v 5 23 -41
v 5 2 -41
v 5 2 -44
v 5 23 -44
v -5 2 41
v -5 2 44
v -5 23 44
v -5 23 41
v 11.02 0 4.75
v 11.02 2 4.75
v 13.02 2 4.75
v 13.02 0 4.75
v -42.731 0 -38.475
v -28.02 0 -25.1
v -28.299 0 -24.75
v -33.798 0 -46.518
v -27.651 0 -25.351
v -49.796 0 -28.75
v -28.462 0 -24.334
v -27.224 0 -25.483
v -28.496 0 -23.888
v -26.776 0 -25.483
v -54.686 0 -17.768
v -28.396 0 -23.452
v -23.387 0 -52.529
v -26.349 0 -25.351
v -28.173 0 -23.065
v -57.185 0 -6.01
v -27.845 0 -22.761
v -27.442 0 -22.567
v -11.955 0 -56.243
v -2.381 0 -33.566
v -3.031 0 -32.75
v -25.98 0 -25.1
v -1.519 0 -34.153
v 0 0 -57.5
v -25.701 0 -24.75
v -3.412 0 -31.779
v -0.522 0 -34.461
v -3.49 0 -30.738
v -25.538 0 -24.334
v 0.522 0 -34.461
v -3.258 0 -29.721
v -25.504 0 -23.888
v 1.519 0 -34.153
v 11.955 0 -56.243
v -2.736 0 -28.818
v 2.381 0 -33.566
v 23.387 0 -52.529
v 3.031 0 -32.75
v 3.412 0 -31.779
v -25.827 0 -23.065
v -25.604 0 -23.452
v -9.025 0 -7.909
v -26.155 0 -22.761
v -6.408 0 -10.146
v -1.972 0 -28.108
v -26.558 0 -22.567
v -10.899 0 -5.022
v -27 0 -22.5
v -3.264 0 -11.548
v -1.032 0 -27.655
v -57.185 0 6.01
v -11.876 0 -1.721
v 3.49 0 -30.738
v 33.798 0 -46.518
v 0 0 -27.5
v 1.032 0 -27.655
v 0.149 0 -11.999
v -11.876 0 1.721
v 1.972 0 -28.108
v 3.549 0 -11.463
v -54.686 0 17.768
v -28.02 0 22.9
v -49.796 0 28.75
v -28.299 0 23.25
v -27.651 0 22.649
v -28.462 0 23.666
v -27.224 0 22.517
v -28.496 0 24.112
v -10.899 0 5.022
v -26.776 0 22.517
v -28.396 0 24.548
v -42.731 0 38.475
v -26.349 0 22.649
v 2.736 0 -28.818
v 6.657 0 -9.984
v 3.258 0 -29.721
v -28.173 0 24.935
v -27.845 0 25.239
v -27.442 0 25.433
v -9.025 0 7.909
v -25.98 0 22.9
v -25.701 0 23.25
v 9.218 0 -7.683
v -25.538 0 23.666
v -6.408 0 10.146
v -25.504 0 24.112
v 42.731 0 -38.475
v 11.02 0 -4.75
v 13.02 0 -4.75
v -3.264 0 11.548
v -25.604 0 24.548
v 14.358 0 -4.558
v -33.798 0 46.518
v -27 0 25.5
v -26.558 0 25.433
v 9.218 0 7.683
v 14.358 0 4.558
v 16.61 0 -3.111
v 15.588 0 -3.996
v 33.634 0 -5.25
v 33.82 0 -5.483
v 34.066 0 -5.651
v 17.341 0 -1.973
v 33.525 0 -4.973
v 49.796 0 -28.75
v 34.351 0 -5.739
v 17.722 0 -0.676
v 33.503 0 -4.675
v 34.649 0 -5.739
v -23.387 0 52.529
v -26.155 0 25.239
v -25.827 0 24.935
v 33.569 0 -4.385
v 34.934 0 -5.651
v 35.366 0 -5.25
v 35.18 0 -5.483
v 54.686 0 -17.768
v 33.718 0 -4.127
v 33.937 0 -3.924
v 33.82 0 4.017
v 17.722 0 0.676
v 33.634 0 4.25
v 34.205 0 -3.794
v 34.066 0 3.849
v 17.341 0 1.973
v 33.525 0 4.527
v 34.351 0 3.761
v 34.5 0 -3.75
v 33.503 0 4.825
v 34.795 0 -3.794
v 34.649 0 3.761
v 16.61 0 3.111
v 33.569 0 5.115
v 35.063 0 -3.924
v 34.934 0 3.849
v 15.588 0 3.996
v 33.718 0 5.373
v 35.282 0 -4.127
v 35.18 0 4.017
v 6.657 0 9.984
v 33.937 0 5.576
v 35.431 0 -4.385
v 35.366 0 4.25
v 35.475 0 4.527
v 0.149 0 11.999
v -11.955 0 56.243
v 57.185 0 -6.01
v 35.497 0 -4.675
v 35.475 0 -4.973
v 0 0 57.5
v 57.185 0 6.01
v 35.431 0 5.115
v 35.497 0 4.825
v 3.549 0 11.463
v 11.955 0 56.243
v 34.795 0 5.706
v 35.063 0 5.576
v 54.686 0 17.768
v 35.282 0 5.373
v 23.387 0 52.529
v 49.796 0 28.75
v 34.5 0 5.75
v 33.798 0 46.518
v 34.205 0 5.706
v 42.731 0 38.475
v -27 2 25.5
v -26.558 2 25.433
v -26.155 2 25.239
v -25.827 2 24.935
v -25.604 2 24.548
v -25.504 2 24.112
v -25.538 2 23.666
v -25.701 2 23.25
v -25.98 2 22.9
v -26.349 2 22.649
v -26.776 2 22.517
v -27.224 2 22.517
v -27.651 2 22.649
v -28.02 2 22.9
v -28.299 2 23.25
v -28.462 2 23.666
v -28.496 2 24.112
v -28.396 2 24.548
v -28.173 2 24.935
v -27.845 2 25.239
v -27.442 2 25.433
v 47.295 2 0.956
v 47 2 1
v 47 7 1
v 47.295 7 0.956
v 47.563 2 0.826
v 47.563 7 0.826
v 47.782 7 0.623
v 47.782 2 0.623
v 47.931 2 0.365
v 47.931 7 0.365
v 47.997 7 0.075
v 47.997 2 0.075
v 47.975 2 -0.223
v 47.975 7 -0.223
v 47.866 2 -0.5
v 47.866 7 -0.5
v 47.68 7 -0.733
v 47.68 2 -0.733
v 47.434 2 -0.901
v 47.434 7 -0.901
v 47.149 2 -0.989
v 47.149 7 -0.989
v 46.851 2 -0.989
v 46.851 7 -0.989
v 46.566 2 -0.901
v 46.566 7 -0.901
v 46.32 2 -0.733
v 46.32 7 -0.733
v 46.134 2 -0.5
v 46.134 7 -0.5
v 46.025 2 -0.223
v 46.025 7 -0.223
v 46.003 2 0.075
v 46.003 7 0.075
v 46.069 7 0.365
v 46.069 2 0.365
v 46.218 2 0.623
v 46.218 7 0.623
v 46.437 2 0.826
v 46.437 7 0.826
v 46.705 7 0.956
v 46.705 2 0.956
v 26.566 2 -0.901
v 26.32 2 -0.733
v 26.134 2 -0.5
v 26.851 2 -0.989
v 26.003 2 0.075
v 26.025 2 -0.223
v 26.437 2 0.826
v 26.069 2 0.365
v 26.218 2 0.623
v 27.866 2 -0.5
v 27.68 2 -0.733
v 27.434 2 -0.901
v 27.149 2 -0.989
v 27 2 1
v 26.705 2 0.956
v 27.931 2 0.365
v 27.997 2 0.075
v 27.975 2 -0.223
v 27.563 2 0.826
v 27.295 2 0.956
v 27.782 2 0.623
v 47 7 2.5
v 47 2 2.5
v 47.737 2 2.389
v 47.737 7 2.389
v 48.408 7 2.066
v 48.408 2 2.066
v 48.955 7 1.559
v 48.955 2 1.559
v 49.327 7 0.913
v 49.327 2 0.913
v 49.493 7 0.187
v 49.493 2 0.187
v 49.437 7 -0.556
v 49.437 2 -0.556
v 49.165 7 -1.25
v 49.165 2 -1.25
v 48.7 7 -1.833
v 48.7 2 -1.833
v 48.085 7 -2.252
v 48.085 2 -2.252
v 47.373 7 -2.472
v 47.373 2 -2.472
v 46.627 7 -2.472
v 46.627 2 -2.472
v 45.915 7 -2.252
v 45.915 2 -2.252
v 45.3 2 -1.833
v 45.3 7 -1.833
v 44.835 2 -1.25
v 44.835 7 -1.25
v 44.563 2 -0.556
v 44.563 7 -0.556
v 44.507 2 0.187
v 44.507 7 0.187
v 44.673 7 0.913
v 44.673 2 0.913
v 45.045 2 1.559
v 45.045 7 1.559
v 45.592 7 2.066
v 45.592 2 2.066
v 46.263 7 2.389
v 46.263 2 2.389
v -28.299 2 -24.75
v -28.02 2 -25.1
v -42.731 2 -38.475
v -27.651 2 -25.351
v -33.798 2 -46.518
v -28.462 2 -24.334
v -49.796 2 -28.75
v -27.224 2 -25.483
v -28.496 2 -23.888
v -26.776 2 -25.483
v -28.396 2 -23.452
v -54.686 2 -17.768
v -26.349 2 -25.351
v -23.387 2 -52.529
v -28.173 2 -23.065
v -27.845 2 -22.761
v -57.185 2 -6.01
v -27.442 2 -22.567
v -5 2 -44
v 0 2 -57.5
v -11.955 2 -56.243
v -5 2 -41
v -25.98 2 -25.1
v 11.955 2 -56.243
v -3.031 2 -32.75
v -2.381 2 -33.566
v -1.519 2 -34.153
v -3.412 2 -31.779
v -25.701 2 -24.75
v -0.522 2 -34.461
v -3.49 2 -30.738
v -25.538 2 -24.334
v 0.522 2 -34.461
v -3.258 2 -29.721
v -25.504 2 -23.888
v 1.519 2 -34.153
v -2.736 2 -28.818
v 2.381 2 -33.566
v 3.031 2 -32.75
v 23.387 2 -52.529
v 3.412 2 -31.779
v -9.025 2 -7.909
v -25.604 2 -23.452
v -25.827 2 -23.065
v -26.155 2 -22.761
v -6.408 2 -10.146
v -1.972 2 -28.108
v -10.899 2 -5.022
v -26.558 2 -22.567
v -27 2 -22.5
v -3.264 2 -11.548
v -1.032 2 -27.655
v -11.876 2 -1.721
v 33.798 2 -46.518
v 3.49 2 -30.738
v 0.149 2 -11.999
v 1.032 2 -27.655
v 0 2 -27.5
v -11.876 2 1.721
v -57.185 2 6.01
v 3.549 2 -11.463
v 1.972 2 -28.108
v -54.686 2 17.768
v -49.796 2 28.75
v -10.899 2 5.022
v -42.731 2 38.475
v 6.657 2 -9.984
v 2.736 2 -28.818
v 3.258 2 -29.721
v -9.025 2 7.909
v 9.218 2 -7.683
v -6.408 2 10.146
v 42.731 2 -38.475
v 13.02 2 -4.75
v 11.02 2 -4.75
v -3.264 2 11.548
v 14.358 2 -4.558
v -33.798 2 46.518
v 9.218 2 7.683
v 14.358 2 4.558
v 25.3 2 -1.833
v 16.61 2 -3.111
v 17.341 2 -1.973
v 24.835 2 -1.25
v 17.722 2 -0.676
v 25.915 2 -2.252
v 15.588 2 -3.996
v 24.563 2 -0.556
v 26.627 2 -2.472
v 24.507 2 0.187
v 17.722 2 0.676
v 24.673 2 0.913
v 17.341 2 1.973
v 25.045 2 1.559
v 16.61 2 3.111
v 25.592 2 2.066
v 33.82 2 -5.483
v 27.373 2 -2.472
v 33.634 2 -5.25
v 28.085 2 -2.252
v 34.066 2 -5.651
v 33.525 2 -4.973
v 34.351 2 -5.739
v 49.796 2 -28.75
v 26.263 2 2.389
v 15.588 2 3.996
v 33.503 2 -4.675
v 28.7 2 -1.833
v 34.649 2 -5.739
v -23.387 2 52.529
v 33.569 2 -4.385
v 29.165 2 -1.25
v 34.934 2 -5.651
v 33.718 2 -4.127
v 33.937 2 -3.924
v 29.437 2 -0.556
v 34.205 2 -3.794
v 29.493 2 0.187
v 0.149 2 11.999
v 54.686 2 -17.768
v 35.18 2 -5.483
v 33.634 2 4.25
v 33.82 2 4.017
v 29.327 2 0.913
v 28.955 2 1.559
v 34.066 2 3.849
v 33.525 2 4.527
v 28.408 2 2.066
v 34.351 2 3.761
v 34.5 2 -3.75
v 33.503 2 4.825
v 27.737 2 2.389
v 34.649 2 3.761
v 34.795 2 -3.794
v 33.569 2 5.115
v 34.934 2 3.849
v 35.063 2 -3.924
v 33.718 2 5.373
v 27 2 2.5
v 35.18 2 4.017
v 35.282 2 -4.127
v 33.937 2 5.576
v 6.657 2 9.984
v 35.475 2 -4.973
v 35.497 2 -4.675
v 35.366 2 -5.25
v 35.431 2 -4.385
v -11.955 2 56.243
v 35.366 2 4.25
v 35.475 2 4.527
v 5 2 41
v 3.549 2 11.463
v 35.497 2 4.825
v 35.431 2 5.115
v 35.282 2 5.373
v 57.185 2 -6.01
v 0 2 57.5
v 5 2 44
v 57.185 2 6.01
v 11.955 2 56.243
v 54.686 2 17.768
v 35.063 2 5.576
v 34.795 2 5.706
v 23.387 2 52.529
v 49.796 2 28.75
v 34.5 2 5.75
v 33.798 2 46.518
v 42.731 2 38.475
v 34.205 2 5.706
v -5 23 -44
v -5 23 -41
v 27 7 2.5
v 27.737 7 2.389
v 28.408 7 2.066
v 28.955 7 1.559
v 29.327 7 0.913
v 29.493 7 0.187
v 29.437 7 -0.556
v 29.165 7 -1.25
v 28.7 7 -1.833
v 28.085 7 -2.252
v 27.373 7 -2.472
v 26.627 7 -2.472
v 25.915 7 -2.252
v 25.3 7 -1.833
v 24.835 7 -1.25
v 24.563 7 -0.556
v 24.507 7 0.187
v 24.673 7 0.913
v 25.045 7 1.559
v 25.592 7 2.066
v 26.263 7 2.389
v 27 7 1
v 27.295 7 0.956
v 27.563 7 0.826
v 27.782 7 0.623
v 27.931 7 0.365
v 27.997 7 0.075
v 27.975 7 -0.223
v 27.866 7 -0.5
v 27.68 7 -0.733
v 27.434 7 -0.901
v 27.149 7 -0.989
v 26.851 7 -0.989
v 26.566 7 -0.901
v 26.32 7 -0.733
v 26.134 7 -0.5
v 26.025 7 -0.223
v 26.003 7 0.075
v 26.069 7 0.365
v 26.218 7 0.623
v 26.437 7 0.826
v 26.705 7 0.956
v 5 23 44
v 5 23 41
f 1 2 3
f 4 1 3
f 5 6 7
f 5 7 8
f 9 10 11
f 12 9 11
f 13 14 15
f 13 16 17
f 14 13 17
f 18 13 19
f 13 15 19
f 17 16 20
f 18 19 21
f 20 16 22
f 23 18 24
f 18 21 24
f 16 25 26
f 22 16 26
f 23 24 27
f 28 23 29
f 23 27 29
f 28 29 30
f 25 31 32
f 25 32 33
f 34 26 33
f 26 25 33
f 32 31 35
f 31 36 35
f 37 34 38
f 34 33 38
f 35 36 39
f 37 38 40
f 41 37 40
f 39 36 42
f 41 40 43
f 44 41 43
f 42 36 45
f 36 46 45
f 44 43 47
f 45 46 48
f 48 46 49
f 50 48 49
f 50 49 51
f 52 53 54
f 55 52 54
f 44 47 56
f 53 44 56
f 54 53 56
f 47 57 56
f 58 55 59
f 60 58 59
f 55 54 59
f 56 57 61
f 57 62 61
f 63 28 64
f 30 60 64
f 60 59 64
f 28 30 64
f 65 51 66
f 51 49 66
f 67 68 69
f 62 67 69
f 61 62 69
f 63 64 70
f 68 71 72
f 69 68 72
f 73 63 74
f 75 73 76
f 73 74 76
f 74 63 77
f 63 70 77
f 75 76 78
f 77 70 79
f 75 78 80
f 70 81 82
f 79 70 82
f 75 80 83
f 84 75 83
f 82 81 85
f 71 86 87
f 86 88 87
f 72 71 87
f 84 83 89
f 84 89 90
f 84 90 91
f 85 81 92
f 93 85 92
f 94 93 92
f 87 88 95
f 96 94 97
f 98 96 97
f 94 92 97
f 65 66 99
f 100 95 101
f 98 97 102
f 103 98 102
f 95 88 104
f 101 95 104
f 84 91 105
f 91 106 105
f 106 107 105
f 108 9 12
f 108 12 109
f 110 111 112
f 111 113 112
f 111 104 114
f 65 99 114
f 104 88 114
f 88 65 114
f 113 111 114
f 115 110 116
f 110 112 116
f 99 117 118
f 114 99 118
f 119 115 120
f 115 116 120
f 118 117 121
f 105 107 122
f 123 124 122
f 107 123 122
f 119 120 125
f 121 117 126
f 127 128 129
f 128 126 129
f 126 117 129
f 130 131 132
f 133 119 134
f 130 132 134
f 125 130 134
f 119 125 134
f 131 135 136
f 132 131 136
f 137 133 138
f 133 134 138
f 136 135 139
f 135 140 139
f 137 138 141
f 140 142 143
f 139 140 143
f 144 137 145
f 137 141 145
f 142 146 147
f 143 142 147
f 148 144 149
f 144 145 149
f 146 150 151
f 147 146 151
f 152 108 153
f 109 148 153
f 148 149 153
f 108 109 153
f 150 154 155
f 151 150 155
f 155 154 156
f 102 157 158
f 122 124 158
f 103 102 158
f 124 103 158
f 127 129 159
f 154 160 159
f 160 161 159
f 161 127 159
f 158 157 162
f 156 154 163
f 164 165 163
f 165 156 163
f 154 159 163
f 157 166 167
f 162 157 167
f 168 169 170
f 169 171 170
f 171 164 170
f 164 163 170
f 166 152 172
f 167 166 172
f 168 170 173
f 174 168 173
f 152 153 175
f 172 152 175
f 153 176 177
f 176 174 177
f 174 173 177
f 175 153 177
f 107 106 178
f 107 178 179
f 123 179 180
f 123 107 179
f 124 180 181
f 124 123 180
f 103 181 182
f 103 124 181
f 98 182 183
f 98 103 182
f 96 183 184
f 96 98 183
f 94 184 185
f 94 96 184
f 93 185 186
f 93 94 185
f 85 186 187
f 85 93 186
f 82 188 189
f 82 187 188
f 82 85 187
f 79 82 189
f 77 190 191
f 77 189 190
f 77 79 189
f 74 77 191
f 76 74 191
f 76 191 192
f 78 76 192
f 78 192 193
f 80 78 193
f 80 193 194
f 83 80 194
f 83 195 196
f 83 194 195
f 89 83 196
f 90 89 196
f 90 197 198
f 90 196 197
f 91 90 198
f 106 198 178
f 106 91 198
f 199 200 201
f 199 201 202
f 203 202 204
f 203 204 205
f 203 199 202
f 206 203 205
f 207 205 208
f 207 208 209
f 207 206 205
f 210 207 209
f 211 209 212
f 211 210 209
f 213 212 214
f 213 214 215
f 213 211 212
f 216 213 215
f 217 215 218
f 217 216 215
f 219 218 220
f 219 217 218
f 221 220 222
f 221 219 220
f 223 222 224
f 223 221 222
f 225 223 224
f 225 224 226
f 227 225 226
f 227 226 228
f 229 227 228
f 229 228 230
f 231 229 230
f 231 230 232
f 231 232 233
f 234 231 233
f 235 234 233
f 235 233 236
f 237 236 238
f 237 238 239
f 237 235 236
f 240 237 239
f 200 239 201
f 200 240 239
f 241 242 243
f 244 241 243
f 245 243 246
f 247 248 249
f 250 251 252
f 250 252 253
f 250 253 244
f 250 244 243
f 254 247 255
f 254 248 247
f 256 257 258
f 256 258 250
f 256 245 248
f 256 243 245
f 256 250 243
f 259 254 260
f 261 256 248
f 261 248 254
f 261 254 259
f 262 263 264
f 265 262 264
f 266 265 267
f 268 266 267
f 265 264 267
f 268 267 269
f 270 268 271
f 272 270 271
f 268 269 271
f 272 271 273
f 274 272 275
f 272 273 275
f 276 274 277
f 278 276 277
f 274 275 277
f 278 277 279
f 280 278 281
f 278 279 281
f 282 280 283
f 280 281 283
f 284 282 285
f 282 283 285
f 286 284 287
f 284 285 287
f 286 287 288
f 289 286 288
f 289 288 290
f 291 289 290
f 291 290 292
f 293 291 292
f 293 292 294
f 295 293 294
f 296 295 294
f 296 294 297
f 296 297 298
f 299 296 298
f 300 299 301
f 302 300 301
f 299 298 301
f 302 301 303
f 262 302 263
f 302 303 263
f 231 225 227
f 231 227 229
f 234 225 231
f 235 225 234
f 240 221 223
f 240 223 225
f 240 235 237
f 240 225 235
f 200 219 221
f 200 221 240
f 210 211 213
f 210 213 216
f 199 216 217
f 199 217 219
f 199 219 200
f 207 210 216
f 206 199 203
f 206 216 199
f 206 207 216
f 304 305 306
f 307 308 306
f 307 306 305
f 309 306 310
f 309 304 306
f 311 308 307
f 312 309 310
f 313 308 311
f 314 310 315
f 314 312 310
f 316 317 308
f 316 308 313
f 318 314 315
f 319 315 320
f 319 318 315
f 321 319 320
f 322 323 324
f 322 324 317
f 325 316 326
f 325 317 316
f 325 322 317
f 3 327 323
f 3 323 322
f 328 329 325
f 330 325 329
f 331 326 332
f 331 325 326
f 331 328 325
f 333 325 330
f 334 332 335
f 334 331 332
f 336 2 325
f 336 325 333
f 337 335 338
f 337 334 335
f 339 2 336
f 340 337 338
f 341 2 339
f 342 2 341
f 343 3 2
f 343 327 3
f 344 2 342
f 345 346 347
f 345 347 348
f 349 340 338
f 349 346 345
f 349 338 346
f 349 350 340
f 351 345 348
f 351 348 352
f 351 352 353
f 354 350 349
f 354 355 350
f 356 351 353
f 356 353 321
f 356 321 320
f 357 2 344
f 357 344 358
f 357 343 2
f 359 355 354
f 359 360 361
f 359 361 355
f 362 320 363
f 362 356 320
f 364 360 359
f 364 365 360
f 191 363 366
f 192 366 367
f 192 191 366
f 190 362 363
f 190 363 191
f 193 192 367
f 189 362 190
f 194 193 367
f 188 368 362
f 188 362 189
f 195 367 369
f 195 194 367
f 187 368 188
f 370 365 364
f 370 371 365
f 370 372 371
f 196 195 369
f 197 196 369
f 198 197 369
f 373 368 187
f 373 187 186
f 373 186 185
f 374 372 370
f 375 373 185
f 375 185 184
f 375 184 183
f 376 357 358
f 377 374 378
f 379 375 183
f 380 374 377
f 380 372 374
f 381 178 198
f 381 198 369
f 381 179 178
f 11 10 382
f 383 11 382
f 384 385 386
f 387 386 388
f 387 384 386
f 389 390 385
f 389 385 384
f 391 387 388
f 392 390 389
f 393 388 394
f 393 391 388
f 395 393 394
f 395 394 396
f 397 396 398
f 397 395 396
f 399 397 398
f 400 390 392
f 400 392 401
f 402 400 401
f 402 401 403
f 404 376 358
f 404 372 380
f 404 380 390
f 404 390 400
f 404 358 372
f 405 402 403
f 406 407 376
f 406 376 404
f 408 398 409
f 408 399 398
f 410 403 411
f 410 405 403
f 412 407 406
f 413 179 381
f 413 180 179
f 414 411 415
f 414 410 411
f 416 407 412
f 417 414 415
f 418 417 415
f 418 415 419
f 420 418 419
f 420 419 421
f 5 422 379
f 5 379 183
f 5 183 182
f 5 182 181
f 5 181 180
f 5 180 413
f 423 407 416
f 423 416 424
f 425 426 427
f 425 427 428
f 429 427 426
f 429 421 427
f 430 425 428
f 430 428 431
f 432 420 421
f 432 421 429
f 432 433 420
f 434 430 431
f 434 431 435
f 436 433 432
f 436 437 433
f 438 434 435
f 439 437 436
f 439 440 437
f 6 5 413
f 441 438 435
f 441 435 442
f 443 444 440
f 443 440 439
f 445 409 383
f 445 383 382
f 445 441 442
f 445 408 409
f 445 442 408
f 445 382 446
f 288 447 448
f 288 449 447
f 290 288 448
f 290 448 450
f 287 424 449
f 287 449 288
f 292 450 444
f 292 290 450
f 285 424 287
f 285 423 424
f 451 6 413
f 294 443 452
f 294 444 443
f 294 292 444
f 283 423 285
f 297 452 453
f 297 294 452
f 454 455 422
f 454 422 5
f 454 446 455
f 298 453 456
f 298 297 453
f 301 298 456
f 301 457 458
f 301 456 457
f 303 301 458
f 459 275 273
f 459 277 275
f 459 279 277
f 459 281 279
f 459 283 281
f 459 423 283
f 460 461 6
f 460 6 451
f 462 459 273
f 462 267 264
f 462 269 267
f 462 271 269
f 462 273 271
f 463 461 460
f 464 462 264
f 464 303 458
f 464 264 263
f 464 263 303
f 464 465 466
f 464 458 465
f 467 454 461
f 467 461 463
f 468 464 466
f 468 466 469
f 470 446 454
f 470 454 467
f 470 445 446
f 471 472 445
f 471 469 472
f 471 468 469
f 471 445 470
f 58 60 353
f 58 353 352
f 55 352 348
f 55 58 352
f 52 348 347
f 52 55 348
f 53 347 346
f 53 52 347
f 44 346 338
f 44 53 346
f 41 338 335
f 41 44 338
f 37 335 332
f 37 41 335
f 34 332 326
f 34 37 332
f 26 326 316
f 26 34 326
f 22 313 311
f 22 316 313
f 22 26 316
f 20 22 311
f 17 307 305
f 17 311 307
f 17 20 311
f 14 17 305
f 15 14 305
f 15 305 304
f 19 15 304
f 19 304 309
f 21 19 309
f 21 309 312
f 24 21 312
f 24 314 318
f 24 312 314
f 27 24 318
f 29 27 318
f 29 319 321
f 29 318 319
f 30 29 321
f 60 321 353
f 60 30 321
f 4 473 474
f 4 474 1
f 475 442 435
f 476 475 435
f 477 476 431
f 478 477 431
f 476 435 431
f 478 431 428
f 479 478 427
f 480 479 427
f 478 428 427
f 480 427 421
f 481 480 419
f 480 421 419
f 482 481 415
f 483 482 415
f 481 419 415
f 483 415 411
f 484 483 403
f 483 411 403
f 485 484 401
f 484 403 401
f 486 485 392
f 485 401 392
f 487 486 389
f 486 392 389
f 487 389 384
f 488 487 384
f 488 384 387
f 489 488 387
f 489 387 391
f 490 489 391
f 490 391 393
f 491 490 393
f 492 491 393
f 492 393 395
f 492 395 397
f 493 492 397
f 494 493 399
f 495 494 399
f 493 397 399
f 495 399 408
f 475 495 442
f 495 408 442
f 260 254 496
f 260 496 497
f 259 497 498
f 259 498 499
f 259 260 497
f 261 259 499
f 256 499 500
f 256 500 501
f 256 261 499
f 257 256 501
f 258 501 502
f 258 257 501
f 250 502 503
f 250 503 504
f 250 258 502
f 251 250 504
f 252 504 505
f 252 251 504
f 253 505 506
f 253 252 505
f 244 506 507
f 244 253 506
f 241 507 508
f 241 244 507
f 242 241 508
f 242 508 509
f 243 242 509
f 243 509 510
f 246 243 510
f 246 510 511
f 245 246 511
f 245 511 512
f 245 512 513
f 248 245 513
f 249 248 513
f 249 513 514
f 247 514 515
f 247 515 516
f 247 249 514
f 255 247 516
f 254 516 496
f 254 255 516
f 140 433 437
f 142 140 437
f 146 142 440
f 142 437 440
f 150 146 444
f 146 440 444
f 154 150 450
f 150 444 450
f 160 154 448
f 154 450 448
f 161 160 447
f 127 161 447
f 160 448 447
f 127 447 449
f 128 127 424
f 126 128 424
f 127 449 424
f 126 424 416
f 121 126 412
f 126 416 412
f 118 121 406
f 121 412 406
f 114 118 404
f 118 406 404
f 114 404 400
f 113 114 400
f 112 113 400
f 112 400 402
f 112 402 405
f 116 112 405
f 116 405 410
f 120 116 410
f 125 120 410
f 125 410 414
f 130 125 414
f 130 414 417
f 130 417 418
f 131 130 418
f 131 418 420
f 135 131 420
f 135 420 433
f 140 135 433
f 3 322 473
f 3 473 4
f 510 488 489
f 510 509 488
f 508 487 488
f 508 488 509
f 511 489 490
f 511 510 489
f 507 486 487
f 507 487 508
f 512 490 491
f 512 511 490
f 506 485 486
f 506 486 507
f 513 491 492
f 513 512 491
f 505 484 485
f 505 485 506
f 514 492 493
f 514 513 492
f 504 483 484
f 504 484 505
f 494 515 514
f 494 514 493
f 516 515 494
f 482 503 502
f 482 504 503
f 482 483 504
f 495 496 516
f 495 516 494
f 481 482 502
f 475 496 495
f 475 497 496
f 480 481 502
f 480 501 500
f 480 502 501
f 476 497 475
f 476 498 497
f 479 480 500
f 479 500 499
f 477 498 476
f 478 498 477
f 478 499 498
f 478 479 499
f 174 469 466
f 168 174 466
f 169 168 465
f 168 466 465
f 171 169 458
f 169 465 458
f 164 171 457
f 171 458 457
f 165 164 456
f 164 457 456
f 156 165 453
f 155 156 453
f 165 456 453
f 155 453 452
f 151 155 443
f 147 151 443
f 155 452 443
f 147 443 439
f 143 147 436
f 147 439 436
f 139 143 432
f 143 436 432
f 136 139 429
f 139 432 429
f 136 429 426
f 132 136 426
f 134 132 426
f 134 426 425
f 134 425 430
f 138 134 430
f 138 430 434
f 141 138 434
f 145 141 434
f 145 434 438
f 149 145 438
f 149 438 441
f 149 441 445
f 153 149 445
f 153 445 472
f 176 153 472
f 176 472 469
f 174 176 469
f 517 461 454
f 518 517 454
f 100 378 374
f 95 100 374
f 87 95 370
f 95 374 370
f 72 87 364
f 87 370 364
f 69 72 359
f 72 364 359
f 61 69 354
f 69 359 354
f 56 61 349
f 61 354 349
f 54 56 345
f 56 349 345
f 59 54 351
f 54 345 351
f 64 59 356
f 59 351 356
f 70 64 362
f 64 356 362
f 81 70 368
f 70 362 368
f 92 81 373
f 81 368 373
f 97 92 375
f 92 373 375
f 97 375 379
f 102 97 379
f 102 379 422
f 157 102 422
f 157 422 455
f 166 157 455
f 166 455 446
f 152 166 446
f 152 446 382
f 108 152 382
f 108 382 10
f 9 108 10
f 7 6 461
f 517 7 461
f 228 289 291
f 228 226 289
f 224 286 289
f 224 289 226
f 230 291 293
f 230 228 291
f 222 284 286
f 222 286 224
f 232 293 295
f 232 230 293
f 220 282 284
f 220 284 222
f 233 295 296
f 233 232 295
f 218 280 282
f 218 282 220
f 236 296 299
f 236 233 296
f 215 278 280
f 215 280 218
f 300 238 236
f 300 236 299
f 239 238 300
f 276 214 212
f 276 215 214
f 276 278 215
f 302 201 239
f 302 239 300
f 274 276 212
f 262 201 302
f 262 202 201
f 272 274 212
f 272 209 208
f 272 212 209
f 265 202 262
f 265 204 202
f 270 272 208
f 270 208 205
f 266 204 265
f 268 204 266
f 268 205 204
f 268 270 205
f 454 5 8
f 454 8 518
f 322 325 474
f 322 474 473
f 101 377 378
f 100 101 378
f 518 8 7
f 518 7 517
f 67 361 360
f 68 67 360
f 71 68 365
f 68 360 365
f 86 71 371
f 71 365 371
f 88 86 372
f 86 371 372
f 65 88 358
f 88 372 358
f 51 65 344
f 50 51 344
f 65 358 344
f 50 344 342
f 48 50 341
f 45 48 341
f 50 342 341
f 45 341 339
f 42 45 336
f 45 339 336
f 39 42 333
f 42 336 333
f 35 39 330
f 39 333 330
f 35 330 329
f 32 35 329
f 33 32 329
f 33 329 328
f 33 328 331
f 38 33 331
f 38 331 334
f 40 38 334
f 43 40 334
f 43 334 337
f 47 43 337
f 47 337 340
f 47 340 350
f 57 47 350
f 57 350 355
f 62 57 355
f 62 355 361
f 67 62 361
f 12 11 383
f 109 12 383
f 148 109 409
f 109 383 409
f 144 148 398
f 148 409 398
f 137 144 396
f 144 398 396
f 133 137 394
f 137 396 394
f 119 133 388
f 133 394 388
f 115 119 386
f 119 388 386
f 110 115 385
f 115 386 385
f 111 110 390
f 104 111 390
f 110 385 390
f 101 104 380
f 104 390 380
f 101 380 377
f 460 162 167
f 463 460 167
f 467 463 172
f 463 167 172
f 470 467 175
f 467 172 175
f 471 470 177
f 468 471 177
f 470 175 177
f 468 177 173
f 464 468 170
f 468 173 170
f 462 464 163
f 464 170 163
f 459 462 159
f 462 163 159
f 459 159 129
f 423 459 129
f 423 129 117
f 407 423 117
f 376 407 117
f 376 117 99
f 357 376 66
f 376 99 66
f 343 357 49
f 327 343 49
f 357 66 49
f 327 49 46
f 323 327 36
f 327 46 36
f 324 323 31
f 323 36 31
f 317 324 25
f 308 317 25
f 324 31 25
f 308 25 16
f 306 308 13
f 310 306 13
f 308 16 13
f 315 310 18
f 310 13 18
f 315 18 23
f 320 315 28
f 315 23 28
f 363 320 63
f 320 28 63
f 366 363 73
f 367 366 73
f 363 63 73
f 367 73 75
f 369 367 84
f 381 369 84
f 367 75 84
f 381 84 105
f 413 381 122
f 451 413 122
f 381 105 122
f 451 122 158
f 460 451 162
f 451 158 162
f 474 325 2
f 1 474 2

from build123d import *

# Parameters (mm, degrees)
ESQUISSE1_R                  = 57.5
BOSS_EXTRU_1_DEPTH           = 2
ESQUISSE2_R                  = 12
ENL_V_MAT_EXTRU_1_DEPTH      = 3
ESQUISSE5_W                  = 10
ESQUISSE5_H                  = 3
BOSS_EXTRU_3_DEPTH           = 21
ESQUISSE8_R                  = 2.5
ESQUISSE8_R_2                = 1
BOSS_EXTRU_4_DEPTH           = 5
ESQUISSE11_R                 = 3.5
ENL_V_MAT_EXTRU_7_DEPTH      = 84.985117729
ENL_V_MAT_EXTRU_8_DEPTH      = 84.985117729
ENL_V_MAT_EXTRU_8_DEPTH_BACK = 84.985117729
ESQUISSE12_R                 = 1.5
ESQUISSE14_R                 = 1
ENL_V_MAT_EXTRU_10_DEPTH     = 84.985117729


with BuildPart() as part:
    # Esquisse1 → Boss.-Extru.1 (new body)
    with BuildSketch(Plane(origin=(0, 0, 0), x_dir=(1, 0, 0), z_dir=(0, 1, 0))):
        with Locations(Location((0, 0, 0), (0, 0, 270))):
            Circle(ESQUISSE1_R)
    extrude(amount=BOSS_EXTRU_1_DEPTH)

    # Esquisse2 → Enlèv. mat.-Extru.1 (cut)
    with BuildSketch(Plane(origin=(0, 2, 0), x_dir=(1, 0, 0), z_dir=(0, 1, 0))):
        with Locations(Location((0, 0, 0), (0, 0, 270))):
            Circle(ESQUISSE2_R)
    extrude(amount=-ENL_V_MAT_EXTRU_1_DEPTH, mode=Mode.SUBTRACT)

    # Esquisse5 → Boss.-Extru.3 (add)
    with BuildSketch(Plane(origin=(0, 2, 0), x_dir=(1, 0, 0), z_dir=(0, 1, 0))):
        with Locations((0, -42.5)):
            Rectangle(ESQUISSE5_W, ESQUISSE5_H)
        with Locations((0, 42.5)):
            Rectangle(ESQUISSE5_W, ESQUISSE5_H)
    extrude(amount=BOSS_EXTRU_3_DEPTH)

    # Esquisse8 → Boss.-Extru.4 (add)
    # profile 1 of 2: a face of its own
    with BuildSketch(Plane(origin=(0, 2, 0), x_dir=(1, 0, 0), z_dir=(0, 1, 0))):
        with Locations(Location((27, 0, 0), (0, 0, 270))):
            Circle(ESQUISSE8_R)
        with Locations(Location((27, 0, 0), (0, 0, 270))):
            Circle(ESQUISSE8_R_2, mode=Mode.SUBTRACT)
    # profile 2 of 2: a face of its own
    with BuildSketch(Plane(origin=(0, 2, 0), x_dir=(1, 0, 0), z_dir=(0, 1, 0))):
        with Locations(Location((47, 0, 0), (0, 0, 270))):
            Circle(ESQUISSE8_R)
        with Locations(Location((47, 0, 0), (0, 0, 270))):
            Circle(ESQUISSE8_R_2, mode=Mode.SUBTRACT)
    extrude(amount=BOSS_EXTRU_4_DEPTH)

    # Esquisse11 → Enlèv. mat.-Extru.7 (cut, through all)
    with BuildSketch(Plane(origin=(0, 2, 0), x_dir=(1, 0, 0), z_dir=(0, 1, 0))):
        with Locations(Location((0, 31, 0), (0, 0, 270))):
            Circle(ESQUISSE11_R)
    extrude(amount=-ENL_V_MAT_EXTRU_7_DEPTH, mode=Mode.SUBTRACT)

    # Esquisse12 → Enlèv. mat.-Extru.8 (cut, two sides: drawn at the far end of the back side and taken through both)
    with BuildSketch(Plane(origin=(0, 2, 0), x_dir=(1, 0, 0), z_dir=(0, 1, 0)).offset(-ENL_V_MAT_EXTRU_8_DEPTH_BACK)):
        with Locations(Location((-27, 24, 0), (0, 0, 270))):
            Circle(ESQUISSE12_R)
        with Locations(Location((-27, -24, 0), (0, 0, 270))):
            Circle(ESQUISSE12_R)
    extrude(amount=ENL_V_MAT_EXTRU_8_DEPTH + ENL_V_MAT_EXTRU_8_DEPTH_BACK, mode=Mode.SUBTRACT)

    # Esquisse14 → Enlèv. mat.-Extru.10 (cut, through all)
    with BuildSketch(Plane(origin=(0, 2, 0), x_dir=(1, 0, 0), z_dir=(0, 1, 0))):
        with Locations(Location((34.5, -4.75, 0), (0, 0, 270))):
            Circle(ESQUISSE14_R)
        with Locations(Location((34.5, 4.75, 0), (0, 0, 270))):
            Circle(ESQUISSE14_R)
        with BuildLine():
            Line((11.01986842, -4.75), (13.01986842, -4.75))
            ThreePointArc((13.01986842, -4.75), (17.76986842, 0), (13.01986842, 4.75))
            Line((13.01986842, 4.75), (11.01986842, 4.75))
            Line((11.01986842, 4.75), (11.01986842, -4.75))
        make_face()
    extrude(amount=-ENL_V_MAT_EXTRU_10_DEPTH, mode=Mode.SUBTRACT)


solid = part.part
